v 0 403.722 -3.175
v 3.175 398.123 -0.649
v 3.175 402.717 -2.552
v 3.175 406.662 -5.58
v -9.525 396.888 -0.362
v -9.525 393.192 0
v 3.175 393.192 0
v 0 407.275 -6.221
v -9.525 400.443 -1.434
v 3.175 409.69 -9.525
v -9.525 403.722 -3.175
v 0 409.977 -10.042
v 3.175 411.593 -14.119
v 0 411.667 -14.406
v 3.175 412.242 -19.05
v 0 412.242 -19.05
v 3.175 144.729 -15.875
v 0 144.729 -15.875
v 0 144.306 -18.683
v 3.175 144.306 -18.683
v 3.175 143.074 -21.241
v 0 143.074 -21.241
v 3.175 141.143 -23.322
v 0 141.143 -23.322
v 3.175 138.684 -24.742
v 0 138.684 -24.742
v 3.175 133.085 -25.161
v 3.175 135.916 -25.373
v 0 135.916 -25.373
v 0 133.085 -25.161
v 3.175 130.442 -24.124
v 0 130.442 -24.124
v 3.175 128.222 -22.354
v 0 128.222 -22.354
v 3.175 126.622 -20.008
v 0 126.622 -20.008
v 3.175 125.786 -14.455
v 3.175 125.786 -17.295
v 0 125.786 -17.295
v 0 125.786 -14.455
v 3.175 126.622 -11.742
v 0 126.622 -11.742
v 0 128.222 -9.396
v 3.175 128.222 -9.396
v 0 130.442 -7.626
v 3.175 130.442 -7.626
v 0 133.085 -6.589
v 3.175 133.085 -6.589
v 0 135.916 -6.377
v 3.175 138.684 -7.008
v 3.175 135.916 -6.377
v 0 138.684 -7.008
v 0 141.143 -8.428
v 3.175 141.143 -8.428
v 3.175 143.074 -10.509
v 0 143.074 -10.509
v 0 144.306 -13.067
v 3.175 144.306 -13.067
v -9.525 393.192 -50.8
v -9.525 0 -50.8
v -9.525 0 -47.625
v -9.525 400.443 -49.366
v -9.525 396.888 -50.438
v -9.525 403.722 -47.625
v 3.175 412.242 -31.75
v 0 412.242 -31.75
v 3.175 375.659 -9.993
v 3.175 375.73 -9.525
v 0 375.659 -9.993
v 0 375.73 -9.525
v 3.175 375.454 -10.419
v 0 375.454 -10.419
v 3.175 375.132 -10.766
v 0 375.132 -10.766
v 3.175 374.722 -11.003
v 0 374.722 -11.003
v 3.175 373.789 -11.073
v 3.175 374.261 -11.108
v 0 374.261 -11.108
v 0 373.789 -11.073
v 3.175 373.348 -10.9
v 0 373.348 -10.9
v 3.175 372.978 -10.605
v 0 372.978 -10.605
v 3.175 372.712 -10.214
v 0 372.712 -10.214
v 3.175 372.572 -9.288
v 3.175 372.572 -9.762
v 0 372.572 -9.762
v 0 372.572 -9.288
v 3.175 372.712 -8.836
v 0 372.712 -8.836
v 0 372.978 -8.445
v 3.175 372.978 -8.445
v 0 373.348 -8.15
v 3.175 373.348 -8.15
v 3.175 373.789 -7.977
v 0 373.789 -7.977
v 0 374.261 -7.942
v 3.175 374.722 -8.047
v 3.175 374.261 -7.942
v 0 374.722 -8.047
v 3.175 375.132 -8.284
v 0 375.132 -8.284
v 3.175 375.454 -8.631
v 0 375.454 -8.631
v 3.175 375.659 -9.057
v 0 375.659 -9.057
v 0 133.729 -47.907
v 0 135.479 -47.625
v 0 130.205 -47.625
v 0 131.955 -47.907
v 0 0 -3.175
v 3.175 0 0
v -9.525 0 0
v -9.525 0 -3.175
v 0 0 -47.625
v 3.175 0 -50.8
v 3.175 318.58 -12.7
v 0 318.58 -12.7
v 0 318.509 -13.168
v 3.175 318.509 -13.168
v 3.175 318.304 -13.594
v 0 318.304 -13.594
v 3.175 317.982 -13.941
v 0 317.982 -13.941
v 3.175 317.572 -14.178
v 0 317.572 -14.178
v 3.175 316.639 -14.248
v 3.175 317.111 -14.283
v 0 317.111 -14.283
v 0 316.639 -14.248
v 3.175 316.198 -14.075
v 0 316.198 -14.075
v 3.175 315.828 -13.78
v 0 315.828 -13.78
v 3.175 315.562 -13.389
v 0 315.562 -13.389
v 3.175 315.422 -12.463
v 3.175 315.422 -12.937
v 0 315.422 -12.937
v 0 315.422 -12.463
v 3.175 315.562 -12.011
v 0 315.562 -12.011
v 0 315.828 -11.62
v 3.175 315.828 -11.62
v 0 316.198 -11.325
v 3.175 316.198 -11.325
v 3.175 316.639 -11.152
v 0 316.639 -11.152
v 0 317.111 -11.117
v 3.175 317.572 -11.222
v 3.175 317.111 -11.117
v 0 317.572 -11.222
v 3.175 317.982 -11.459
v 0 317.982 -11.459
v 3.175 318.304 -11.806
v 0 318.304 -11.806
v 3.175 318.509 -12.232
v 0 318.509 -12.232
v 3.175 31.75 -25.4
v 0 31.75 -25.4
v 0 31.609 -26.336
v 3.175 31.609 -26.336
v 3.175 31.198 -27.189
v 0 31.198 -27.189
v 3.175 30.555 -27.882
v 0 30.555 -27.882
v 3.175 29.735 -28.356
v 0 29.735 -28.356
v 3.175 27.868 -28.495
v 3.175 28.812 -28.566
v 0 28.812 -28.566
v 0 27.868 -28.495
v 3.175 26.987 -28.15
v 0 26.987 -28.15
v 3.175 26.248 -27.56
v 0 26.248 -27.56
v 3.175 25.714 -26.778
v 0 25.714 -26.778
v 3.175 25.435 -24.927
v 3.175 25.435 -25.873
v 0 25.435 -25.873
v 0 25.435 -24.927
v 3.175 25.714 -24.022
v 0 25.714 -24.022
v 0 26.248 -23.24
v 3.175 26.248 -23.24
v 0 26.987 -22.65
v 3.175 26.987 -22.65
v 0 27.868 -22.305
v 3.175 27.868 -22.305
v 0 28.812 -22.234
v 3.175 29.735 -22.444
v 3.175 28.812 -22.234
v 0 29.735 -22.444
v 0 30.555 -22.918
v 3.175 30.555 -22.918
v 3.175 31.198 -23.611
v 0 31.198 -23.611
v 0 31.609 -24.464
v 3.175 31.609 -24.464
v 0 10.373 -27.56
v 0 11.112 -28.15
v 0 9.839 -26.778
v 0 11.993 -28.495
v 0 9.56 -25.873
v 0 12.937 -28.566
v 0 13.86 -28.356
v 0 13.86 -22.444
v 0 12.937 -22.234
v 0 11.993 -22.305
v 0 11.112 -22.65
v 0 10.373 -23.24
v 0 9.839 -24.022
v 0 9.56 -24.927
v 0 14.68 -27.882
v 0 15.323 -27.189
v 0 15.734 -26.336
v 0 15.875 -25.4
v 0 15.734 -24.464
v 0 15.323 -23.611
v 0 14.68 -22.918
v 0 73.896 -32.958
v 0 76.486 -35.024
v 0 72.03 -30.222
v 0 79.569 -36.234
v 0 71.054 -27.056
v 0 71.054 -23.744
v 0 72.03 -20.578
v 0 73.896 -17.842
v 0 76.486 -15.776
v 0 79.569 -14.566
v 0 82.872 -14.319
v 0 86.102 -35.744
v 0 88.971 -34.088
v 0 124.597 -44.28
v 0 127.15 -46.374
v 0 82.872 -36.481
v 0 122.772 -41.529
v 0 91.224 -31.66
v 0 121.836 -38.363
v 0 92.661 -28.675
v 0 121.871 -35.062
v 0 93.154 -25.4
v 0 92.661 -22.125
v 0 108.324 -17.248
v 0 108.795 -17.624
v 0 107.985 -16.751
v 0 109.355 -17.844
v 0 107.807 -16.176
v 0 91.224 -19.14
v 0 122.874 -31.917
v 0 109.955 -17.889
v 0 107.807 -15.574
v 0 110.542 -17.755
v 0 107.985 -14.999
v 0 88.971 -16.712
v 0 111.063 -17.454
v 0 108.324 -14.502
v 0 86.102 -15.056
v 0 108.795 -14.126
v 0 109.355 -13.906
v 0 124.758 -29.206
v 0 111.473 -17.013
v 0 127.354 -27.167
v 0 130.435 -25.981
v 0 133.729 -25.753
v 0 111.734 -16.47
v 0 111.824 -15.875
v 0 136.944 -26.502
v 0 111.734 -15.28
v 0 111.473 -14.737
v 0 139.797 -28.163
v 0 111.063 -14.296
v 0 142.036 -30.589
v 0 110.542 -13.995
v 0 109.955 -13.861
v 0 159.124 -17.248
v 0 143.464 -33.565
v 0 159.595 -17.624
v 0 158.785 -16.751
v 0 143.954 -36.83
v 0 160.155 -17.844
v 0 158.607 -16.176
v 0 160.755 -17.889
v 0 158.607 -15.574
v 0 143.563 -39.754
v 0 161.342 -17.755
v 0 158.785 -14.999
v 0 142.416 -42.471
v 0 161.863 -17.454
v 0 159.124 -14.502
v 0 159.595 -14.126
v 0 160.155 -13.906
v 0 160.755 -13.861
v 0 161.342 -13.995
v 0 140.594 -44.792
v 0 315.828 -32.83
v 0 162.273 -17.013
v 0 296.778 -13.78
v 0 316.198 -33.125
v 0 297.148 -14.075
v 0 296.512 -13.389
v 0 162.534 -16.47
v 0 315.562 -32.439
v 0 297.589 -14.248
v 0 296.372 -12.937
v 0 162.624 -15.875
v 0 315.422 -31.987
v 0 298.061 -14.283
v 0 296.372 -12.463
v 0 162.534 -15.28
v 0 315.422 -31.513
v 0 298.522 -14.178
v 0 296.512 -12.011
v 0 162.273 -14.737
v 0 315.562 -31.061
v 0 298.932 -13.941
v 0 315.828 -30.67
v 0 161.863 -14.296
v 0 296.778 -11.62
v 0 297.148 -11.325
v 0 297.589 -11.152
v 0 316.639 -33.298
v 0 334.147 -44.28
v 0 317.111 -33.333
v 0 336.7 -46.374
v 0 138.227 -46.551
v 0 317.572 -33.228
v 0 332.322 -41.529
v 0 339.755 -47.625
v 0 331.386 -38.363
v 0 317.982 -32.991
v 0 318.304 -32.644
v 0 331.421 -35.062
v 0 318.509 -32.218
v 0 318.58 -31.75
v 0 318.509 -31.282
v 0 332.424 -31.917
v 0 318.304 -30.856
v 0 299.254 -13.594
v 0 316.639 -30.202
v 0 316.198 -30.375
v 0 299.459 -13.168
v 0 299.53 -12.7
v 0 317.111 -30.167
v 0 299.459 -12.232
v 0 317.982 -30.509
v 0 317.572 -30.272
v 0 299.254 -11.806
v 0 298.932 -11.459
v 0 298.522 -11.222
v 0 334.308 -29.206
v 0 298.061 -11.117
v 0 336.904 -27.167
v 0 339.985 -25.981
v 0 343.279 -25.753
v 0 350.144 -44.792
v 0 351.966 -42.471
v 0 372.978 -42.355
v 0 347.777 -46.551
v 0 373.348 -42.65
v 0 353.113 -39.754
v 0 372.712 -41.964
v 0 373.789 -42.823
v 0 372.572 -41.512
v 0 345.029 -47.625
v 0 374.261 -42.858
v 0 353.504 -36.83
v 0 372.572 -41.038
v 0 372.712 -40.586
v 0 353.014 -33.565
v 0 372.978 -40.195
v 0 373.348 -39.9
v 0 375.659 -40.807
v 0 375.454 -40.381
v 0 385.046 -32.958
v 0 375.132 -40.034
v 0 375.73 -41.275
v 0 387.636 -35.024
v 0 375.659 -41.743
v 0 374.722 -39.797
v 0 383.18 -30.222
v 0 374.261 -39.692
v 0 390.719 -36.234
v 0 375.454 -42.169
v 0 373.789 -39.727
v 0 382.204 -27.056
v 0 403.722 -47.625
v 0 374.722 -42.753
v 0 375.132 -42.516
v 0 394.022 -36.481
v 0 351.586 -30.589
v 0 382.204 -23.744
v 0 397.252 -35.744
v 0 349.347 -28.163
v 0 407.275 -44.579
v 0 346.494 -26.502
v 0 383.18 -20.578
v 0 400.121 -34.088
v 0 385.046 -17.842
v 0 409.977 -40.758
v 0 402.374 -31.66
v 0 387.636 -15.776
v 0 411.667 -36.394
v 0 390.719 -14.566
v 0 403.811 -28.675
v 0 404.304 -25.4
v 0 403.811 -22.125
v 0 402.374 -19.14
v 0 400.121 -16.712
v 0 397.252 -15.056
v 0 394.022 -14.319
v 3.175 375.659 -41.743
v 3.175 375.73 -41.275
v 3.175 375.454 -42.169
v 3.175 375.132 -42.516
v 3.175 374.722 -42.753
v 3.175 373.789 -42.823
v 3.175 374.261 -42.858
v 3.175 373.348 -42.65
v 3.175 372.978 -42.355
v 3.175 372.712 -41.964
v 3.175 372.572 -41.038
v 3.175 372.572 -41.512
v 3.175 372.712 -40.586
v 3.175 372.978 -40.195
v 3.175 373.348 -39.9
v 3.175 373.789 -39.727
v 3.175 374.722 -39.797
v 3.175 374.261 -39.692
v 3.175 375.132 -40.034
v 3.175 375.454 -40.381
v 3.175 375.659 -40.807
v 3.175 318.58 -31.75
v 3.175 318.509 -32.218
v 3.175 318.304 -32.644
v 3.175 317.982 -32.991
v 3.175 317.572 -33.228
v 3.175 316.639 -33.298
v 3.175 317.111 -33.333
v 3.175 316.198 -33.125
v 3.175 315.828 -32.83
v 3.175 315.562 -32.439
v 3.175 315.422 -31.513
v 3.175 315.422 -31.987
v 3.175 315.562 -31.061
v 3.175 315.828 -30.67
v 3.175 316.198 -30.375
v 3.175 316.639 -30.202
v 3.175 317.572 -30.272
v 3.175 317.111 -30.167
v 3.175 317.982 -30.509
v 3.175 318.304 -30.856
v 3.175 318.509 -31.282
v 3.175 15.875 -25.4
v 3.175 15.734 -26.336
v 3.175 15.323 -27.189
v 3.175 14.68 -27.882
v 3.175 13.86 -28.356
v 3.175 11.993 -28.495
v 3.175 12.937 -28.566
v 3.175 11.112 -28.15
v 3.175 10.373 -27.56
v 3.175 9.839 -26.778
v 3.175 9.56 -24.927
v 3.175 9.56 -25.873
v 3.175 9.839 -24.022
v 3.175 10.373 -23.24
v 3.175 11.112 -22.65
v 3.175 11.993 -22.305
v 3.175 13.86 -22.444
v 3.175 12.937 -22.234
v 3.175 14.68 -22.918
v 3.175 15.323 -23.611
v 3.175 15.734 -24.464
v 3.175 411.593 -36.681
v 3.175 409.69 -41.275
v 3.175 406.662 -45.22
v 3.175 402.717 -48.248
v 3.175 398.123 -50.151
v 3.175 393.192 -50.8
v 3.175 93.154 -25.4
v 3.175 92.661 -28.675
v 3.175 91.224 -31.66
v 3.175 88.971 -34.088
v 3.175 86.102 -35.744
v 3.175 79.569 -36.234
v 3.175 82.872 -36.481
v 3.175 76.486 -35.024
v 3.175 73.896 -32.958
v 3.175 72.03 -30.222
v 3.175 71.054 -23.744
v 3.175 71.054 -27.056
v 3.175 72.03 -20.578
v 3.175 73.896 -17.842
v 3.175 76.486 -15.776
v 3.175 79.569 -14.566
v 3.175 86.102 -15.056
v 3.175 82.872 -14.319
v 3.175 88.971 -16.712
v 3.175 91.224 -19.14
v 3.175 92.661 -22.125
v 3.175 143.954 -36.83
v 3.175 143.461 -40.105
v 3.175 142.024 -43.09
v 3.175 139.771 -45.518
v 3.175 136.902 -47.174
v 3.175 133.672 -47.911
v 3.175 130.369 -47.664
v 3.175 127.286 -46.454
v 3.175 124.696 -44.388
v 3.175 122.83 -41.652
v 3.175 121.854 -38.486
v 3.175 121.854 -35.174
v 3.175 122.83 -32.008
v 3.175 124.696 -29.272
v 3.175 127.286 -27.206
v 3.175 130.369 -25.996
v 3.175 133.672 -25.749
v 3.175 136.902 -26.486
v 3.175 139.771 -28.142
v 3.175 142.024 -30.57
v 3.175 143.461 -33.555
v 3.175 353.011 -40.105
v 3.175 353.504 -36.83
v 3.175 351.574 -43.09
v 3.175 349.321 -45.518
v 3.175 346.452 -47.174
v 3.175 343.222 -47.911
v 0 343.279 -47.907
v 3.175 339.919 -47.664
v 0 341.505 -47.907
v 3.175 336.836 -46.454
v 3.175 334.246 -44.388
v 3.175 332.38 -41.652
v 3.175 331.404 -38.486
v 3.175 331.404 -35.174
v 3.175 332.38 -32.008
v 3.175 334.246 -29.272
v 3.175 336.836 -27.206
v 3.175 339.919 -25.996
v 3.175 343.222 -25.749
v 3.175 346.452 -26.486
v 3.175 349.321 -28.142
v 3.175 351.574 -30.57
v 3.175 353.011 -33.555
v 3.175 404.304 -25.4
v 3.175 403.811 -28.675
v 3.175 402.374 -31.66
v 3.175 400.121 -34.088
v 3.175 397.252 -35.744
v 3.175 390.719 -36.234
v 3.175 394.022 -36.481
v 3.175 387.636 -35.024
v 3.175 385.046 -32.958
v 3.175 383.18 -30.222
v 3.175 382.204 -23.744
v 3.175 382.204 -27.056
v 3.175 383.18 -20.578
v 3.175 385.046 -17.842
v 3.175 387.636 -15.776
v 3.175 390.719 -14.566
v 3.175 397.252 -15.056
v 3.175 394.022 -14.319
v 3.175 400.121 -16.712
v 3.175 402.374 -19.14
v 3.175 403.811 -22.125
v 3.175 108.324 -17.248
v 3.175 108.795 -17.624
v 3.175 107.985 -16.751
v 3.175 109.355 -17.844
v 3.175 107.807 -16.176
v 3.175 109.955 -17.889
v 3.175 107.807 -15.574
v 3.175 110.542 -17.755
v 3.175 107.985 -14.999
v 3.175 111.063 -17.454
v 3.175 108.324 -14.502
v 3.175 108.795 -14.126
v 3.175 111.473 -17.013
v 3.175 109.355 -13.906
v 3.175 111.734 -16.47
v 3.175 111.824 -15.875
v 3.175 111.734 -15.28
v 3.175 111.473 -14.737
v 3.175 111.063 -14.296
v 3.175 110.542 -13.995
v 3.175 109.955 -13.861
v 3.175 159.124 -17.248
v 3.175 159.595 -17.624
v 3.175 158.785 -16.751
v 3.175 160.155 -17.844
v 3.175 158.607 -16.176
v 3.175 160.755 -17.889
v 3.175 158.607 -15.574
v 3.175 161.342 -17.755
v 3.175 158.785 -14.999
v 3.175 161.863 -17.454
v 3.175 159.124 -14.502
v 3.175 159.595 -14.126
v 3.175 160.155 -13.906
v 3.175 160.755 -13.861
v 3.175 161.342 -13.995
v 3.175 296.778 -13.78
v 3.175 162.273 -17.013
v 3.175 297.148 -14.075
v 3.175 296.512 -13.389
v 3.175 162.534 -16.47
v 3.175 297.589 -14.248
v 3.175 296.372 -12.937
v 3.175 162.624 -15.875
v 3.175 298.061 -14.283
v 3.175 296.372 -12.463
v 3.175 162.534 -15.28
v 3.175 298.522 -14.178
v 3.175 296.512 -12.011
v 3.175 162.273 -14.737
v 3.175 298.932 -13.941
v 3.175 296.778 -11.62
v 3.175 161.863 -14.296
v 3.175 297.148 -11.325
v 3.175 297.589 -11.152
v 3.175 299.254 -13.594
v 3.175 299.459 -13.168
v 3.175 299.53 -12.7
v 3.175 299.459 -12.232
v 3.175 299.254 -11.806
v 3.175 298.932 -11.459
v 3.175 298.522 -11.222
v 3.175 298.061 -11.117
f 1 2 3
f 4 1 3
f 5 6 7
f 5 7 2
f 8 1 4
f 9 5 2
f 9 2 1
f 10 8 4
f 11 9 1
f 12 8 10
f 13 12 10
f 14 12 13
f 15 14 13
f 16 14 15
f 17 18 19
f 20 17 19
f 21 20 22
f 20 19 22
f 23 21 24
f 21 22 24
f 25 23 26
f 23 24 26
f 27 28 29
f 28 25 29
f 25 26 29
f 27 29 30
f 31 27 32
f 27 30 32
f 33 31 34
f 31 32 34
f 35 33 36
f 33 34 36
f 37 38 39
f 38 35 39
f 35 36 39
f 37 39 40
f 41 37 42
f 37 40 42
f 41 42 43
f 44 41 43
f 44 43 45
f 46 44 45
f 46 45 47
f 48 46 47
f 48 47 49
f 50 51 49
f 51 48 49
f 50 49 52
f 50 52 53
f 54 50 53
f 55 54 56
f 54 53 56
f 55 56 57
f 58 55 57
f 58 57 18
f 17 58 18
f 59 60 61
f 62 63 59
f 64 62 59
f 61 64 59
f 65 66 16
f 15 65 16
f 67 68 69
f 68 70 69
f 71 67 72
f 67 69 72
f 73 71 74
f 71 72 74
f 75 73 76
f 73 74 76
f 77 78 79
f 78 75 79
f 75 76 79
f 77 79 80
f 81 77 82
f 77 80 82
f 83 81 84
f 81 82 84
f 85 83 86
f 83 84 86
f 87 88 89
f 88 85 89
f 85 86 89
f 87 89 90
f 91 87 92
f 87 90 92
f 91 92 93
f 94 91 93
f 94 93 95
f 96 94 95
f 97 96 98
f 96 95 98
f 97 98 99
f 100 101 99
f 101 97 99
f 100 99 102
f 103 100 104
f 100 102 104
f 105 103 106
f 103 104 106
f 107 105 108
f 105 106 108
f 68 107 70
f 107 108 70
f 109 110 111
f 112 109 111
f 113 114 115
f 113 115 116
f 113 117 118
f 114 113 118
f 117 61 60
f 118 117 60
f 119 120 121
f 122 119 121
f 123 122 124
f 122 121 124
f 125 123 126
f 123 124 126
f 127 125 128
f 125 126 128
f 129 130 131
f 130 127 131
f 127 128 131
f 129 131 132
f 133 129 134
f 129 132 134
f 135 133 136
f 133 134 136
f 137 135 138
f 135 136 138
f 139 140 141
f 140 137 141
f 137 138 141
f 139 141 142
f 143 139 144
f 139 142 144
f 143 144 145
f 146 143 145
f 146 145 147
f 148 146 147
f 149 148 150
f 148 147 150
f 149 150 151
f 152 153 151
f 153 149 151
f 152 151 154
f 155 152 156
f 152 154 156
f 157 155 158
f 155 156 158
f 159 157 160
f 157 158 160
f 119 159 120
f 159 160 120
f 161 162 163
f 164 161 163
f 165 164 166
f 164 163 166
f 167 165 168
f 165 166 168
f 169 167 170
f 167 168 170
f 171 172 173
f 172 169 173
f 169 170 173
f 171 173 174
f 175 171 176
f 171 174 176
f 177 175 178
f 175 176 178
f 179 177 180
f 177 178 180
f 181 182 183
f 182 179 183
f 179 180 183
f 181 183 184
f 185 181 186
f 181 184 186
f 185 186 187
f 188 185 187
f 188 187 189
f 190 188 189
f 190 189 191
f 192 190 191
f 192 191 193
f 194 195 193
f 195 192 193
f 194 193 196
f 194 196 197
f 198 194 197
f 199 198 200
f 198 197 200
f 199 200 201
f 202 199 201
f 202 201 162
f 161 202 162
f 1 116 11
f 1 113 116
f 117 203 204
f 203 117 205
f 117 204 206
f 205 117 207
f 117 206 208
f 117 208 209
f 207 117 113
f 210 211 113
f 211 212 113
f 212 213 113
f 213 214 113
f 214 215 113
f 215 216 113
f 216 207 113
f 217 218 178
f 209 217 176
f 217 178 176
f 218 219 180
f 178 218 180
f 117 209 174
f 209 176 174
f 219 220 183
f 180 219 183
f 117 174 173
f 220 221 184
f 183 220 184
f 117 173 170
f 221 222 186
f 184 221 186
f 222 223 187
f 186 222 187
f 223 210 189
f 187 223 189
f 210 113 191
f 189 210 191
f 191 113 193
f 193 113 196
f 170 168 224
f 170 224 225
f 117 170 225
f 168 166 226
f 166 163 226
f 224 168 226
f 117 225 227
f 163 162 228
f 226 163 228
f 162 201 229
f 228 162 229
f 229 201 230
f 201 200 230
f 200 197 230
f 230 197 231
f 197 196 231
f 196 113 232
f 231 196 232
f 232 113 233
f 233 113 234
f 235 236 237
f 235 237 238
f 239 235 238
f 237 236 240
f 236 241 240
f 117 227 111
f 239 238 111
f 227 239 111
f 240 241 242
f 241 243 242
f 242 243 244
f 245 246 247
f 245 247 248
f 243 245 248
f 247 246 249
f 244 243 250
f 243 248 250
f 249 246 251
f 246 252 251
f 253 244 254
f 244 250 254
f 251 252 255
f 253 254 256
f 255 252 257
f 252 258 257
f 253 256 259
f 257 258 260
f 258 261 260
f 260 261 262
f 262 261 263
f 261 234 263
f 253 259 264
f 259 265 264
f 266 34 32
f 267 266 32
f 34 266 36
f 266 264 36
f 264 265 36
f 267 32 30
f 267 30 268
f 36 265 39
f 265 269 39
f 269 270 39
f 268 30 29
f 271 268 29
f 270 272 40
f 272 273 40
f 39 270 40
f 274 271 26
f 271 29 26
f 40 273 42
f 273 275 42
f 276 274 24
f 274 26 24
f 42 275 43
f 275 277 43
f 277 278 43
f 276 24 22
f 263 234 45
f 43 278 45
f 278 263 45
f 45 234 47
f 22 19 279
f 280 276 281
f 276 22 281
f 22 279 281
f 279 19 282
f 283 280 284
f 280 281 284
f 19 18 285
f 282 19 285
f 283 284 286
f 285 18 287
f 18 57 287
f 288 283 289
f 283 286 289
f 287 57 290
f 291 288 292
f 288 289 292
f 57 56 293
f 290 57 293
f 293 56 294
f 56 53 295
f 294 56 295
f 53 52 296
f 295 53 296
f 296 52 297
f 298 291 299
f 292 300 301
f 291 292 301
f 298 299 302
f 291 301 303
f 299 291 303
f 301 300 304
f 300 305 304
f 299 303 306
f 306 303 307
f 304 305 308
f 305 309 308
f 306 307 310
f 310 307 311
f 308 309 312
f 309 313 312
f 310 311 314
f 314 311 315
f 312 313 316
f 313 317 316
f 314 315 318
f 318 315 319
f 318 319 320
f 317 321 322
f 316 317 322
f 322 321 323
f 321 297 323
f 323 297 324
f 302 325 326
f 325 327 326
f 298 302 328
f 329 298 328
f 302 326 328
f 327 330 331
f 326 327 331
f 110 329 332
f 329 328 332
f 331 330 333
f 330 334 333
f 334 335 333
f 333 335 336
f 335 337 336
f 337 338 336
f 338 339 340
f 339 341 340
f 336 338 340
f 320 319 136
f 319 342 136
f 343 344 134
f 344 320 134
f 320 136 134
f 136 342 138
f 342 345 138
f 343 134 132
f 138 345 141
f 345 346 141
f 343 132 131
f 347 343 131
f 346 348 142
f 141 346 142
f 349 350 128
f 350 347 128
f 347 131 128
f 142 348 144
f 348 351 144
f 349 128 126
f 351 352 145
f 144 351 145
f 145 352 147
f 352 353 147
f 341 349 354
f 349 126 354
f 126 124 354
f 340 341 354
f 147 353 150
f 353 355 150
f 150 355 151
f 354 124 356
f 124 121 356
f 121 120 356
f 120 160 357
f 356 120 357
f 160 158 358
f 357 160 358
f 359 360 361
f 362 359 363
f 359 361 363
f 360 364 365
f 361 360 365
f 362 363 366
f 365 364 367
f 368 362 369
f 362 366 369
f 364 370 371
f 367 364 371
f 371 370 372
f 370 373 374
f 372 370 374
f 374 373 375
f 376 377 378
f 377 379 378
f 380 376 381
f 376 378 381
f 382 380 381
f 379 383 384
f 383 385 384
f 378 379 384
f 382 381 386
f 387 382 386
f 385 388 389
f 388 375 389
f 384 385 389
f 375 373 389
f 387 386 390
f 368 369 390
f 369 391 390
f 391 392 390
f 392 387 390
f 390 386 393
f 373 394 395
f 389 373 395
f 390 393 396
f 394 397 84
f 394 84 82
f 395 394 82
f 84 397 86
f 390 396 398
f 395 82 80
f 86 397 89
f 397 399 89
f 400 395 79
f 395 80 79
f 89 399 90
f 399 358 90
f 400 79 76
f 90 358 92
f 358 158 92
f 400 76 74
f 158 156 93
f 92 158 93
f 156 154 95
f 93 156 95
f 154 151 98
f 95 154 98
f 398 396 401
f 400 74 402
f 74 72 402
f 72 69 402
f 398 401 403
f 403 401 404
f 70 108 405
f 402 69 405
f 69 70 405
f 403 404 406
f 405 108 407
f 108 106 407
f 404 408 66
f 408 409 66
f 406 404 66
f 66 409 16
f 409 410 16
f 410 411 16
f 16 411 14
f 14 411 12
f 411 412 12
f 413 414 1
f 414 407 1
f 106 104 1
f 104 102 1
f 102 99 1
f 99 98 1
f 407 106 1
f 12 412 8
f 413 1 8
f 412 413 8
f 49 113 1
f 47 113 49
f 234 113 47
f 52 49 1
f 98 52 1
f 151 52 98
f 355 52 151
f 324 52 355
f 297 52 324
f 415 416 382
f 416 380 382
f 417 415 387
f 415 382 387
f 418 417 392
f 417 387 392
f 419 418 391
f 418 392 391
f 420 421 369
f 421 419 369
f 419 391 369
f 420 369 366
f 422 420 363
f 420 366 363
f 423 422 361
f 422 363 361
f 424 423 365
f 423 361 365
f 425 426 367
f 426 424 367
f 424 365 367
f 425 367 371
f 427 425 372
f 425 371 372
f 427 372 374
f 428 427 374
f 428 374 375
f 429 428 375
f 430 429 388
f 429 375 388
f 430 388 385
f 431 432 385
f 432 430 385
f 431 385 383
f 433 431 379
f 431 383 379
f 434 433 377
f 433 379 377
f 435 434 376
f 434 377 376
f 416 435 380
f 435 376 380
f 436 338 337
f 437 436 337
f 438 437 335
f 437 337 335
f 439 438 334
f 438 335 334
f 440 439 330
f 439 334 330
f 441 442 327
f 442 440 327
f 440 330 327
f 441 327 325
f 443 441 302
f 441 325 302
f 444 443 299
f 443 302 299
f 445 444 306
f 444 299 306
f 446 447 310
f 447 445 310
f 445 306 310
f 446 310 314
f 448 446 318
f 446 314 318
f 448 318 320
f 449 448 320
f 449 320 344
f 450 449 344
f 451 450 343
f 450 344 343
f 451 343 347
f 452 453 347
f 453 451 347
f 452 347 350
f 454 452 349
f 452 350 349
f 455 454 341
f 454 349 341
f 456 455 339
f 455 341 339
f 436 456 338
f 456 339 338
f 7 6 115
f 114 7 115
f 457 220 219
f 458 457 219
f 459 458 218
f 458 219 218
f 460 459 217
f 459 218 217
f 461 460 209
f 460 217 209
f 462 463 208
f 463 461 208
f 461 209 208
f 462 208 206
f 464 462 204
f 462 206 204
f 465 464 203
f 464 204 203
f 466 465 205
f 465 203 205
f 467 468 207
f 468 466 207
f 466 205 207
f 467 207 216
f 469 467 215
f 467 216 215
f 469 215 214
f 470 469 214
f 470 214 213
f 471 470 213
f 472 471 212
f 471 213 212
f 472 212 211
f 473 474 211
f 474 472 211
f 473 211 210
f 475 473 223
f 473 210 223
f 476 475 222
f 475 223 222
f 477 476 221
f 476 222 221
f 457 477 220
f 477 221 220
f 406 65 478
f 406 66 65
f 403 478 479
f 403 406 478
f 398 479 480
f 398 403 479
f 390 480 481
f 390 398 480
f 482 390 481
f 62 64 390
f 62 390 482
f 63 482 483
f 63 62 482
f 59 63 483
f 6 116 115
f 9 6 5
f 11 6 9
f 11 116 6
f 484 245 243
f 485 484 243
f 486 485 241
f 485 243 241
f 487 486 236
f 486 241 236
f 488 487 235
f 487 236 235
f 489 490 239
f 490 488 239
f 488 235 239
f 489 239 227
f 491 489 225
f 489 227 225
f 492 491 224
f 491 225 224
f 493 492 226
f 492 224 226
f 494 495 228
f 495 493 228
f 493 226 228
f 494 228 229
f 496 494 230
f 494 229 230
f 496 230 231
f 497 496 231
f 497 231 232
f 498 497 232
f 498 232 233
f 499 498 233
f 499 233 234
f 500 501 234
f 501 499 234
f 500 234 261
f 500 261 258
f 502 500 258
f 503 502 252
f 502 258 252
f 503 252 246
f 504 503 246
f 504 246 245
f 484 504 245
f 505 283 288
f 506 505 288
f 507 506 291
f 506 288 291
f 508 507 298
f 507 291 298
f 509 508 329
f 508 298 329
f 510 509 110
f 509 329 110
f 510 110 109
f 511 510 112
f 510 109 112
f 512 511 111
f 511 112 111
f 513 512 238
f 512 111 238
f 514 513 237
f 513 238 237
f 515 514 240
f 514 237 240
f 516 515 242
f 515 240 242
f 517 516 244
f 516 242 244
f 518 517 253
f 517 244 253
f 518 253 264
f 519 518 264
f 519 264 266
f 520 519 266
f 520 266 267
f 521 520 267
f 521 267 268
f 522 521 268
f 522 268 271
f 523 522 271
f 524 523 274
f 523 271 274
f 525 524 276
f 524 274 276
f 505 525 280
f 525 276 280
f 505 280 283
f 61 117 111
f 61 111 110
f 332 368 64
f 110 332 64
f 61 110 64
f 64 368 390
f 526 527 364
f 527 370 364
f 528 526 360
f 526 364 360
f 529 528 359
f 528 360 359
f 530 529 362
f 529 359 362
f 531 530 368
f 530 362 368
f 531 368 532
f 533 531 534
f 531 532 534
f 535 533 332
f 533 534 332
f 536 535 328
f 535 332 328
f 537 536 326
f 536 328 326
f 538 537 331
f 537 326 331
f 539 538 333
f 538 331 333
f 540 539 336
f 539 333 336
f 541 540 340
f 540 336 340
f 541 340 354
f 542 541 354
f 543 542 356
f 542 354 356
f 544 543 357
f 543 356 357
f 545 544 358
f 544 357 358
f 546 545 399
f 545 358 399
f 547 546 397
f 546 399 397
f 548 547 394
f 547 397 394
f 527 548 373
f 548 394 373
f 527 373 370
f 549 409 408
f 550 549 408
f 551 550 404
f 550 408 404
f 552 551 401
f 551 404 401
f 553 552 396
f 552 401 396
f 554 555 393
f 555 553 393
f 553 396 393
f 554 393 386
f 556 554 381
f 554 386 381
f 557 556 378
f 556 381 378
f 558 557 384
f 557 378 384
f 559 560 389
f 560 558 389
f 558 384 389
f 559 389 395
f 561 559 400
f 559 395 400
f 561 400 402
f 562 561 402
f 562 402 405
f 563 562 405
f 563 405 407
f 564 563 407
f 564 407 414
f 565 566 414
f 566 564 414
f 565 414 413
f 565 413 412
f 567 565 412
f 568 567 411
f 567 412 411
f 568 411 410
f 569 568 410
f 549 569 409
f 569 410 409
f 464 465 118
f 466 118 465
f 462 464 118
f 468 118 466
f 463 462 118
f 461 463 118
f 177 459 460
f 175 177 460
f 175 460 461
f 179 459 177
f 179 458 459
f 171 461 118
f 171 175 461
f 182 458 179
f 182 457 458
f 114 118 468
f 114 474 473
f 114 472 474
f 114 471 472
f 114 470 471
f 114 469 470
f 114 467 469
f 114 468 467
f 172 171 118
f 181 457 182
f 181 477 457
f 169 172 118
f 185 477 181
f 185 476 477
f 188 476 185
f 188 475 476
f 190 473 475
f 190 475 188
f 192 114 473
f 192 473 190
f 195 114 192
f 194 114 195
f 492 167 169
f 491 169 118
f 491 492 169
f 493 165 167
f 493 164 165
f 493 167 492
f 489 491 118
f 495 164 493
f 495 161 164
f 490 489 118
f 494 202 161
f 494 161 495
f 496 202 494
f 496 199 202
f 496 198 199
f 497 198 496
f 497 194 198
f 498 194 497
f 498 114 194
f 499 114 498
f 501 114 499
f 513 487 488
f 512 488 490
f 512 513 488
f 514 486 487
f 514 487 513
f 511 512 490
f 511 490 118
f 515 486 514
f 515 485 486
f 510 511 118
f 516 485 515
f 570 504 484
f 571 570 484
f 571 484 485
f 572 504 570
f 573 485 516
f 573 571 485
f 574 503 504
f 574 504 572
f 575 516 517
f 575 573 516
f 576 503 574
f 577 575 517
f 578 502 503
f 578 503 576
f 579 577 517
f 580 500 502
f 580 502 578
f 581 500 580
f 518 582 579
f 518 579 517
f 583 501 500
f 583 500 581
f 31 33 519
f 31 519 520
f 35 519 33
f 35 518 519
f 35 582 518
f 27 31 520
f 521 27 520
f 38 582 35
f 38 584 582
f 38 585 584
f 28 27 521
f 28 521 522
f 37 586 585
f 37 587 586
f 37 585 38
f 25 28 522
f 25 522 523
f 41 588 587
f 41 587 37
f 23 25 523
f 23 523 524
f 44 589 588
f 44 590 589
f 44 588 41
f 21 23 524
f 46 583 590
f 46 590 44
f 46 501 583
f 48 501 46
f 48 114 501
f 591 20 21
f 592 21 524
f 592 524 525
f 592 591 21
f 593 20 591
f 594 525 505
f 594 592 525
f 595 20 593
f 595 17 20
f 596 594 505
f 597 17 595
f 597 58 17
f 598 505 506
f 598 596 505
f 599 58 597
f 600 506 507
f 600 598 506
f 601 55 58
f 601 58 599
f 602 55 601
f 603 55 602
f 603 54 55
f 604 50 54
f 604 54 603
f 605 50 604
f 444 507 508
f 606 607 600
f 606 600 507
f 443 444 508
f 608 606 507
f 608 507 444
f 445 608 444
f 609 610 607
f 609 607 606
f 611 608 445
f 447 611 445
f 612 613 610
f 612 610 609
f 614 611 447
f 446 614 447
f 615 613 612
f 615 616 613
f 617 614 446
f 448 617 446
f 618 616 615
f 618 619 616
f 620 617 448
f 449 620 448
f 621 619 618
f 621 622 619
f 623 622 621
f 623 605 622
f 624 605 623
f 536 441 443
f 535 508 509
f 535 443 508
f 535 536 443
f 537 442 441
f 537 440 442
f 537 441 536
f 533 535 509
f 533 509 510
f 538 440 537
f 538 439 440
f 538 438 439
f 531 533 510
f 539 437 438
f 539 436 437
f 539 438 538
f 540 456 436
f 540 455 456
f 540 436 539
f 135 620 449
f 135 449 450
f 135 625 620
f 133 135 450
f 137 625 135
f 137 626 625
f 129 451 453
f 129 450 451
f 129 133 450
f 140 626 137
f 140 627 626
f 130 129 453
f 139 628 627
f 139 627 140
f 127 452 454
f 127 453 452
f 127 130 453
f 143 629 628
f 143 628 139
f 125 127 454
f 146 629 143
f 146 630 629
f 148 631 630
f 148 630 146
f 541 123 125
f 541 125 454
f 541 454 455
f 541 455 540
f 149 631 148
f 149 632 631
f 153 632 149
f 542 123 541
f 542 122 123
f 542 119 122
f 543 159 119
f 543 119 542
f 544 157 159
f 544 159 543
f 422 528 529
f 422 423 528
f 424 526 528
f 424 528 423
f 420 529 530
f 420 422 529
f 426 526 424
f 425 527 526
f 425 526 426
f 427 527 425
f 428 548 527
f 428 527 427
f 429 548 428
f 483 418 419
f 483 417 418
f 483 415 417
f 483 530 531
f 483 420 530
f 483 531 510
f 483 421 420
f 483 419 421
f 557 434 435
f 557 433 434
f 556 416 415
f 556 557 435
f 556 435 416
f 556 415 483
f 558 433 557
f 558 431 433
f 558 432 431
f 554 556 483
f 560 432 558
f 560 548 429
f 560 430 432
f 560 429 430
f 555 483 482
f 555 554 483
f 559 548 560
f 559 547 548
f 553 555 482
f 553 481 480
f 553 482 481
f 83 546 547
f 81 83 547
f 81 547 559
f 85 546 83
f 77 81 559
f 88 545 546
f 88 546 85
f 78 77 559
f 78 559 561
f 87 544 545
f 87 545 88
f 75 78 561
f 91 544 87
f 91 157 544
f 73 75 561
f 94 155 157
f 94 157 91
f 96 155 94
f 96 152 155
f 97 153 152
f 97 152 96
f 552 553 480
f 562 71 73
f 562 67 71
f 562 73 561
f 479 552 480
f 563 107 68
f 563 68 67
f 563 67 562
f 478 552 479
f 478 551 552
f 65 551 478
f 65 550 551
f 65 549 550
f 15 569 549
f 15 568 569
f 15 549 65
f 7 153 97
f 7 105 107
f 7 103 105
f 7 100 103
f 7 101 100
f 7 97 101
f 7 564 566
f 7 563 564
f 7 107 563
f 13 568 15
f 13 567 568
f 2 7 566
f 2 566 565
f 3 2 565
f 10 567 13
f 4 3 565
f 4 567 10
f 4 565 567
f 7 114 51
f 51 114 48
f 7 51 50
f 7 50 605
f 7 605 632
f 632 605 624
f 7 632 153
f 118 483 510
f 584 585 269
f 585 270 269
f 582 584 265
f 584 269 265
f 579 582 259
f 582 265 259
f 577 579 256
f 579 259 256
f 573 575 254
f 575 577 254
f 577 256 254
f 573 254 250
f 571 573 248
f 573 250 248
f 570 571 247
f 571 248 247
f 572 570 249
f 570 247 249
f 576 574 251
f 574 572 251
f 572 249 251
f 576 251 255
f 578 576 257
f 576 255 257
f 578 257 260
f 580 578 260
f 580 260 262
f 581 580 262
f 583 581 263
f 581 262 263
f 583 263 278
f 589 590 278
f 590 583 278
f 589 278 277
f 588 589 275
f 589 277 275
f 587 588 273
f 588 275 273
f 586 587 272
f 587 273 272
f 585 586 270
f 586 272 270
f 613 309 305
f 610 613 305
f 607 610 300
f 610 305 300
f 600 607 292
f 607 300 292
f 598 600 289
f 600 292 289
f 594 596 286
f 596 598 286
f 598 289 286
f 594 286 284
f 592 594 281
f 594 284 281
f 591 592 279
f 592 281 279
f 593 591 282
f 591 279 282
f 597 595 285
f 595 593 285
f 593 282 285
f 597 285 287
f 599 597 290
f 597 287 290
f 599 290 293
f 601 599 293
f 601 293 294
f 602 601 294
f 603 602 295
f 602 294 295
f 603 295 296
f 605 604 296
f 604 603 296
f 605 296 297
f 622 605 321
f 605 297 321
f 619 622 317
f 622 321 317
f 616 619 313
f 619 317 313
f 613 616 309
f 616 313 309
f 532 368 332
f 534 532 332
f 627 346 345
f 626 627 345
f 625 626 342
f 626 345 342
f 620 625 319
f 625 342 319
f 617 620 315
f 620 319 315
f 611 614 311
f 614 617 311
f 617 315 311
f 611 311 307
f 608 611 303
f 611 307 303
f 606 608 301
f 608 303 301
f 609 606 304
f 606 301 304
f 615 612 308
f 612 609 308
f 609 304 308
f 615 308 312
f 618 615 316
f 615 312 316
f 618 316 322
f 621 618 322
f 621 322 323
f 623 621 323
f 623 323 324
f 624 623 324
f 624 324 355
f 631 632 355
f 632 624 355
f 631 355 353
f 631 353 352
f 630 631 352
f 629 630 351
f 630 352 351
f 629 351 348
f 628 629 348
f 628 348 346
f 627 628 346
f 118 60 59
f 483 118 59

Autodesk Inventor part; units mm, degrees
ref_plane "YZ Plane" through (0, 0, 0) normal (1, 0, 0) x (0, 1, 0)
ref_plane "XZ Plane" through (0, 0, 0) normal (0, 1, 0) x (-1, 0, 0)
ref_plane "XY Plane" through (0, 0, 0) normal (0, 0, 1) x (1, 0, 0)
sketch "Sketch1" plane through (0, 0, 0) normal (1, 0, 0) x (0, 1, 0)
  line L0 (0, 0) -> (0, -50.8)
  line L1 (0, -50.8) -> (412.242, -50.8)
  line L2 (412.242, -50.8) -> (412.242, 0)
  line L3 (412.242, 0) -> (0, 0)
  line L4 (412.242, -25.4) -> (0, -25.4) construction
  circle A0 centre (82.042, -25.4) radius 11.1125
  circle A1 centre (393.192, -25.4) radius 11.1125
  line L5 (0, -13.97) -> (412.242, -13.97) construction
  line L6 (132.842, -13.97) -> (132.842, -36.83) construction
  line L7 (342.392, -13.97) -> (342.392, -36.83) construction
  circle A2 centre (132.842, -36.83) radius 11.1125
  circle A3 centre (342.392, -36.83) radius 11.1125
  line L8 (132.842, -36.83) -> (342.392, -36.83) construction
  line L9 (160.6042, -15.875) -> (109.8042, -15.875) construction
  circle A4 centre (135.2042, -15.875) radius 9.525
  circle A5 centre (160.6042, -15.875) radius 2.0193
  circle A6 centre (109.8042, -15.875) radius 2.0193
  circle A7 centre (374.142, -9.525) radius 1.5875
  circle A8 centre (374.142, -41.275) radius 1.5875
  circle A9 centre (12.7, -25.4) radius 3.175
  circle A10 centre (28.575, -25.4) radius 3.175
  line L10 (374.142, -41.275) -> (374.142, -9.525) construction
  line L11 (316.992, -12.7) -> (297.942, -12.7) construction
  line L12 (316.992, 0) -> (316.992, -50.8) construction
  circle A11 centre (316.992, -12.7) radius 1.5875
  circle A12 centre (297.942, -12.7) radius 1.5875
  circle A13 centre (316.992, -31.75) radius 1.5875
  point P0 (374.142, -25.4)
  dimension "d0" = 50.8
  dimension "d3" = 22.225
  dimension "d4" = 311.15
  dimension "d5" = 19.05
  dimension "d12" = 82.042
  dimension "d18" = 11.43
  dimension "d19" = 50.8
  dimension "d20" = 50.8
  dimension "d29" = 15.875
  dimension "d30" = 50.8
  dimension "d31" = 53.1622
  dimension "d35" = 4.0386
  dimension "d36" = 19.05
  dimension "d37" = 22.225
  dimension "d38" = 12.7
  dimension "d39" = 15.875
  dimension "d40" = 6.35
  dimension "d41" = 31.75
  dimension "d42" = 19.05
  dimension "d43" = 3.175
  dimension "d44" = 19.05
  dimension "d45" = 19.05
  dimension "d47" = 6.35
  dimension "d48" = 234.95
extrude "Extrusion1" add sketch "Sketch1" along normal blind 3.175
sketch "Sketch2" plane through (0, 0, 0) normal (-1, 0, 0) x (0, 0, 1)
  line L0 (0, 412.242) -> (0, 0) projected
  line L1 (-50.8, 412.242) -> (0, 412.242) construction
  line L2 (0, 0) -> (-3.175, 0)
  line L3 (-3.175, 0) -> (-3.175, 412.242)
  line L4 (-3.175, 412.242) -> (0, 412.242)
  line L5 (0, 412.242) -> (0, 0)
  line L6 (-50.8, 0) -> (-50.8, 412.242) projected
  line L7 (-50.8, 0) -> (-47.625, 0)
  line L8 (-47.625, 0) -> (-47.625, 412.242)
  line L9 (-47.625, 412.242) -> (-50.8, 412.242)
  line L10 (-50.8, 412.242) -> (-50.8, 0)
  dimension "d13" = 3.175
  dimension "d14" = 3.175
extrude "Extrusion2" add sketch "Sketch2" along normal blind 9.525
fillet "Fillet2" radius 19.05 2 edges at (-3.175, 412.242, 0) (-3.175, 412.242, -50.8)
equation "\"d20\" = d19"
equation "\"d29\" = d23"
equation "\"d45\" = d44"
equation "\"d14\" = d13"
equation "\"d23\" = 15.875"
properties part number "Front C Left"
